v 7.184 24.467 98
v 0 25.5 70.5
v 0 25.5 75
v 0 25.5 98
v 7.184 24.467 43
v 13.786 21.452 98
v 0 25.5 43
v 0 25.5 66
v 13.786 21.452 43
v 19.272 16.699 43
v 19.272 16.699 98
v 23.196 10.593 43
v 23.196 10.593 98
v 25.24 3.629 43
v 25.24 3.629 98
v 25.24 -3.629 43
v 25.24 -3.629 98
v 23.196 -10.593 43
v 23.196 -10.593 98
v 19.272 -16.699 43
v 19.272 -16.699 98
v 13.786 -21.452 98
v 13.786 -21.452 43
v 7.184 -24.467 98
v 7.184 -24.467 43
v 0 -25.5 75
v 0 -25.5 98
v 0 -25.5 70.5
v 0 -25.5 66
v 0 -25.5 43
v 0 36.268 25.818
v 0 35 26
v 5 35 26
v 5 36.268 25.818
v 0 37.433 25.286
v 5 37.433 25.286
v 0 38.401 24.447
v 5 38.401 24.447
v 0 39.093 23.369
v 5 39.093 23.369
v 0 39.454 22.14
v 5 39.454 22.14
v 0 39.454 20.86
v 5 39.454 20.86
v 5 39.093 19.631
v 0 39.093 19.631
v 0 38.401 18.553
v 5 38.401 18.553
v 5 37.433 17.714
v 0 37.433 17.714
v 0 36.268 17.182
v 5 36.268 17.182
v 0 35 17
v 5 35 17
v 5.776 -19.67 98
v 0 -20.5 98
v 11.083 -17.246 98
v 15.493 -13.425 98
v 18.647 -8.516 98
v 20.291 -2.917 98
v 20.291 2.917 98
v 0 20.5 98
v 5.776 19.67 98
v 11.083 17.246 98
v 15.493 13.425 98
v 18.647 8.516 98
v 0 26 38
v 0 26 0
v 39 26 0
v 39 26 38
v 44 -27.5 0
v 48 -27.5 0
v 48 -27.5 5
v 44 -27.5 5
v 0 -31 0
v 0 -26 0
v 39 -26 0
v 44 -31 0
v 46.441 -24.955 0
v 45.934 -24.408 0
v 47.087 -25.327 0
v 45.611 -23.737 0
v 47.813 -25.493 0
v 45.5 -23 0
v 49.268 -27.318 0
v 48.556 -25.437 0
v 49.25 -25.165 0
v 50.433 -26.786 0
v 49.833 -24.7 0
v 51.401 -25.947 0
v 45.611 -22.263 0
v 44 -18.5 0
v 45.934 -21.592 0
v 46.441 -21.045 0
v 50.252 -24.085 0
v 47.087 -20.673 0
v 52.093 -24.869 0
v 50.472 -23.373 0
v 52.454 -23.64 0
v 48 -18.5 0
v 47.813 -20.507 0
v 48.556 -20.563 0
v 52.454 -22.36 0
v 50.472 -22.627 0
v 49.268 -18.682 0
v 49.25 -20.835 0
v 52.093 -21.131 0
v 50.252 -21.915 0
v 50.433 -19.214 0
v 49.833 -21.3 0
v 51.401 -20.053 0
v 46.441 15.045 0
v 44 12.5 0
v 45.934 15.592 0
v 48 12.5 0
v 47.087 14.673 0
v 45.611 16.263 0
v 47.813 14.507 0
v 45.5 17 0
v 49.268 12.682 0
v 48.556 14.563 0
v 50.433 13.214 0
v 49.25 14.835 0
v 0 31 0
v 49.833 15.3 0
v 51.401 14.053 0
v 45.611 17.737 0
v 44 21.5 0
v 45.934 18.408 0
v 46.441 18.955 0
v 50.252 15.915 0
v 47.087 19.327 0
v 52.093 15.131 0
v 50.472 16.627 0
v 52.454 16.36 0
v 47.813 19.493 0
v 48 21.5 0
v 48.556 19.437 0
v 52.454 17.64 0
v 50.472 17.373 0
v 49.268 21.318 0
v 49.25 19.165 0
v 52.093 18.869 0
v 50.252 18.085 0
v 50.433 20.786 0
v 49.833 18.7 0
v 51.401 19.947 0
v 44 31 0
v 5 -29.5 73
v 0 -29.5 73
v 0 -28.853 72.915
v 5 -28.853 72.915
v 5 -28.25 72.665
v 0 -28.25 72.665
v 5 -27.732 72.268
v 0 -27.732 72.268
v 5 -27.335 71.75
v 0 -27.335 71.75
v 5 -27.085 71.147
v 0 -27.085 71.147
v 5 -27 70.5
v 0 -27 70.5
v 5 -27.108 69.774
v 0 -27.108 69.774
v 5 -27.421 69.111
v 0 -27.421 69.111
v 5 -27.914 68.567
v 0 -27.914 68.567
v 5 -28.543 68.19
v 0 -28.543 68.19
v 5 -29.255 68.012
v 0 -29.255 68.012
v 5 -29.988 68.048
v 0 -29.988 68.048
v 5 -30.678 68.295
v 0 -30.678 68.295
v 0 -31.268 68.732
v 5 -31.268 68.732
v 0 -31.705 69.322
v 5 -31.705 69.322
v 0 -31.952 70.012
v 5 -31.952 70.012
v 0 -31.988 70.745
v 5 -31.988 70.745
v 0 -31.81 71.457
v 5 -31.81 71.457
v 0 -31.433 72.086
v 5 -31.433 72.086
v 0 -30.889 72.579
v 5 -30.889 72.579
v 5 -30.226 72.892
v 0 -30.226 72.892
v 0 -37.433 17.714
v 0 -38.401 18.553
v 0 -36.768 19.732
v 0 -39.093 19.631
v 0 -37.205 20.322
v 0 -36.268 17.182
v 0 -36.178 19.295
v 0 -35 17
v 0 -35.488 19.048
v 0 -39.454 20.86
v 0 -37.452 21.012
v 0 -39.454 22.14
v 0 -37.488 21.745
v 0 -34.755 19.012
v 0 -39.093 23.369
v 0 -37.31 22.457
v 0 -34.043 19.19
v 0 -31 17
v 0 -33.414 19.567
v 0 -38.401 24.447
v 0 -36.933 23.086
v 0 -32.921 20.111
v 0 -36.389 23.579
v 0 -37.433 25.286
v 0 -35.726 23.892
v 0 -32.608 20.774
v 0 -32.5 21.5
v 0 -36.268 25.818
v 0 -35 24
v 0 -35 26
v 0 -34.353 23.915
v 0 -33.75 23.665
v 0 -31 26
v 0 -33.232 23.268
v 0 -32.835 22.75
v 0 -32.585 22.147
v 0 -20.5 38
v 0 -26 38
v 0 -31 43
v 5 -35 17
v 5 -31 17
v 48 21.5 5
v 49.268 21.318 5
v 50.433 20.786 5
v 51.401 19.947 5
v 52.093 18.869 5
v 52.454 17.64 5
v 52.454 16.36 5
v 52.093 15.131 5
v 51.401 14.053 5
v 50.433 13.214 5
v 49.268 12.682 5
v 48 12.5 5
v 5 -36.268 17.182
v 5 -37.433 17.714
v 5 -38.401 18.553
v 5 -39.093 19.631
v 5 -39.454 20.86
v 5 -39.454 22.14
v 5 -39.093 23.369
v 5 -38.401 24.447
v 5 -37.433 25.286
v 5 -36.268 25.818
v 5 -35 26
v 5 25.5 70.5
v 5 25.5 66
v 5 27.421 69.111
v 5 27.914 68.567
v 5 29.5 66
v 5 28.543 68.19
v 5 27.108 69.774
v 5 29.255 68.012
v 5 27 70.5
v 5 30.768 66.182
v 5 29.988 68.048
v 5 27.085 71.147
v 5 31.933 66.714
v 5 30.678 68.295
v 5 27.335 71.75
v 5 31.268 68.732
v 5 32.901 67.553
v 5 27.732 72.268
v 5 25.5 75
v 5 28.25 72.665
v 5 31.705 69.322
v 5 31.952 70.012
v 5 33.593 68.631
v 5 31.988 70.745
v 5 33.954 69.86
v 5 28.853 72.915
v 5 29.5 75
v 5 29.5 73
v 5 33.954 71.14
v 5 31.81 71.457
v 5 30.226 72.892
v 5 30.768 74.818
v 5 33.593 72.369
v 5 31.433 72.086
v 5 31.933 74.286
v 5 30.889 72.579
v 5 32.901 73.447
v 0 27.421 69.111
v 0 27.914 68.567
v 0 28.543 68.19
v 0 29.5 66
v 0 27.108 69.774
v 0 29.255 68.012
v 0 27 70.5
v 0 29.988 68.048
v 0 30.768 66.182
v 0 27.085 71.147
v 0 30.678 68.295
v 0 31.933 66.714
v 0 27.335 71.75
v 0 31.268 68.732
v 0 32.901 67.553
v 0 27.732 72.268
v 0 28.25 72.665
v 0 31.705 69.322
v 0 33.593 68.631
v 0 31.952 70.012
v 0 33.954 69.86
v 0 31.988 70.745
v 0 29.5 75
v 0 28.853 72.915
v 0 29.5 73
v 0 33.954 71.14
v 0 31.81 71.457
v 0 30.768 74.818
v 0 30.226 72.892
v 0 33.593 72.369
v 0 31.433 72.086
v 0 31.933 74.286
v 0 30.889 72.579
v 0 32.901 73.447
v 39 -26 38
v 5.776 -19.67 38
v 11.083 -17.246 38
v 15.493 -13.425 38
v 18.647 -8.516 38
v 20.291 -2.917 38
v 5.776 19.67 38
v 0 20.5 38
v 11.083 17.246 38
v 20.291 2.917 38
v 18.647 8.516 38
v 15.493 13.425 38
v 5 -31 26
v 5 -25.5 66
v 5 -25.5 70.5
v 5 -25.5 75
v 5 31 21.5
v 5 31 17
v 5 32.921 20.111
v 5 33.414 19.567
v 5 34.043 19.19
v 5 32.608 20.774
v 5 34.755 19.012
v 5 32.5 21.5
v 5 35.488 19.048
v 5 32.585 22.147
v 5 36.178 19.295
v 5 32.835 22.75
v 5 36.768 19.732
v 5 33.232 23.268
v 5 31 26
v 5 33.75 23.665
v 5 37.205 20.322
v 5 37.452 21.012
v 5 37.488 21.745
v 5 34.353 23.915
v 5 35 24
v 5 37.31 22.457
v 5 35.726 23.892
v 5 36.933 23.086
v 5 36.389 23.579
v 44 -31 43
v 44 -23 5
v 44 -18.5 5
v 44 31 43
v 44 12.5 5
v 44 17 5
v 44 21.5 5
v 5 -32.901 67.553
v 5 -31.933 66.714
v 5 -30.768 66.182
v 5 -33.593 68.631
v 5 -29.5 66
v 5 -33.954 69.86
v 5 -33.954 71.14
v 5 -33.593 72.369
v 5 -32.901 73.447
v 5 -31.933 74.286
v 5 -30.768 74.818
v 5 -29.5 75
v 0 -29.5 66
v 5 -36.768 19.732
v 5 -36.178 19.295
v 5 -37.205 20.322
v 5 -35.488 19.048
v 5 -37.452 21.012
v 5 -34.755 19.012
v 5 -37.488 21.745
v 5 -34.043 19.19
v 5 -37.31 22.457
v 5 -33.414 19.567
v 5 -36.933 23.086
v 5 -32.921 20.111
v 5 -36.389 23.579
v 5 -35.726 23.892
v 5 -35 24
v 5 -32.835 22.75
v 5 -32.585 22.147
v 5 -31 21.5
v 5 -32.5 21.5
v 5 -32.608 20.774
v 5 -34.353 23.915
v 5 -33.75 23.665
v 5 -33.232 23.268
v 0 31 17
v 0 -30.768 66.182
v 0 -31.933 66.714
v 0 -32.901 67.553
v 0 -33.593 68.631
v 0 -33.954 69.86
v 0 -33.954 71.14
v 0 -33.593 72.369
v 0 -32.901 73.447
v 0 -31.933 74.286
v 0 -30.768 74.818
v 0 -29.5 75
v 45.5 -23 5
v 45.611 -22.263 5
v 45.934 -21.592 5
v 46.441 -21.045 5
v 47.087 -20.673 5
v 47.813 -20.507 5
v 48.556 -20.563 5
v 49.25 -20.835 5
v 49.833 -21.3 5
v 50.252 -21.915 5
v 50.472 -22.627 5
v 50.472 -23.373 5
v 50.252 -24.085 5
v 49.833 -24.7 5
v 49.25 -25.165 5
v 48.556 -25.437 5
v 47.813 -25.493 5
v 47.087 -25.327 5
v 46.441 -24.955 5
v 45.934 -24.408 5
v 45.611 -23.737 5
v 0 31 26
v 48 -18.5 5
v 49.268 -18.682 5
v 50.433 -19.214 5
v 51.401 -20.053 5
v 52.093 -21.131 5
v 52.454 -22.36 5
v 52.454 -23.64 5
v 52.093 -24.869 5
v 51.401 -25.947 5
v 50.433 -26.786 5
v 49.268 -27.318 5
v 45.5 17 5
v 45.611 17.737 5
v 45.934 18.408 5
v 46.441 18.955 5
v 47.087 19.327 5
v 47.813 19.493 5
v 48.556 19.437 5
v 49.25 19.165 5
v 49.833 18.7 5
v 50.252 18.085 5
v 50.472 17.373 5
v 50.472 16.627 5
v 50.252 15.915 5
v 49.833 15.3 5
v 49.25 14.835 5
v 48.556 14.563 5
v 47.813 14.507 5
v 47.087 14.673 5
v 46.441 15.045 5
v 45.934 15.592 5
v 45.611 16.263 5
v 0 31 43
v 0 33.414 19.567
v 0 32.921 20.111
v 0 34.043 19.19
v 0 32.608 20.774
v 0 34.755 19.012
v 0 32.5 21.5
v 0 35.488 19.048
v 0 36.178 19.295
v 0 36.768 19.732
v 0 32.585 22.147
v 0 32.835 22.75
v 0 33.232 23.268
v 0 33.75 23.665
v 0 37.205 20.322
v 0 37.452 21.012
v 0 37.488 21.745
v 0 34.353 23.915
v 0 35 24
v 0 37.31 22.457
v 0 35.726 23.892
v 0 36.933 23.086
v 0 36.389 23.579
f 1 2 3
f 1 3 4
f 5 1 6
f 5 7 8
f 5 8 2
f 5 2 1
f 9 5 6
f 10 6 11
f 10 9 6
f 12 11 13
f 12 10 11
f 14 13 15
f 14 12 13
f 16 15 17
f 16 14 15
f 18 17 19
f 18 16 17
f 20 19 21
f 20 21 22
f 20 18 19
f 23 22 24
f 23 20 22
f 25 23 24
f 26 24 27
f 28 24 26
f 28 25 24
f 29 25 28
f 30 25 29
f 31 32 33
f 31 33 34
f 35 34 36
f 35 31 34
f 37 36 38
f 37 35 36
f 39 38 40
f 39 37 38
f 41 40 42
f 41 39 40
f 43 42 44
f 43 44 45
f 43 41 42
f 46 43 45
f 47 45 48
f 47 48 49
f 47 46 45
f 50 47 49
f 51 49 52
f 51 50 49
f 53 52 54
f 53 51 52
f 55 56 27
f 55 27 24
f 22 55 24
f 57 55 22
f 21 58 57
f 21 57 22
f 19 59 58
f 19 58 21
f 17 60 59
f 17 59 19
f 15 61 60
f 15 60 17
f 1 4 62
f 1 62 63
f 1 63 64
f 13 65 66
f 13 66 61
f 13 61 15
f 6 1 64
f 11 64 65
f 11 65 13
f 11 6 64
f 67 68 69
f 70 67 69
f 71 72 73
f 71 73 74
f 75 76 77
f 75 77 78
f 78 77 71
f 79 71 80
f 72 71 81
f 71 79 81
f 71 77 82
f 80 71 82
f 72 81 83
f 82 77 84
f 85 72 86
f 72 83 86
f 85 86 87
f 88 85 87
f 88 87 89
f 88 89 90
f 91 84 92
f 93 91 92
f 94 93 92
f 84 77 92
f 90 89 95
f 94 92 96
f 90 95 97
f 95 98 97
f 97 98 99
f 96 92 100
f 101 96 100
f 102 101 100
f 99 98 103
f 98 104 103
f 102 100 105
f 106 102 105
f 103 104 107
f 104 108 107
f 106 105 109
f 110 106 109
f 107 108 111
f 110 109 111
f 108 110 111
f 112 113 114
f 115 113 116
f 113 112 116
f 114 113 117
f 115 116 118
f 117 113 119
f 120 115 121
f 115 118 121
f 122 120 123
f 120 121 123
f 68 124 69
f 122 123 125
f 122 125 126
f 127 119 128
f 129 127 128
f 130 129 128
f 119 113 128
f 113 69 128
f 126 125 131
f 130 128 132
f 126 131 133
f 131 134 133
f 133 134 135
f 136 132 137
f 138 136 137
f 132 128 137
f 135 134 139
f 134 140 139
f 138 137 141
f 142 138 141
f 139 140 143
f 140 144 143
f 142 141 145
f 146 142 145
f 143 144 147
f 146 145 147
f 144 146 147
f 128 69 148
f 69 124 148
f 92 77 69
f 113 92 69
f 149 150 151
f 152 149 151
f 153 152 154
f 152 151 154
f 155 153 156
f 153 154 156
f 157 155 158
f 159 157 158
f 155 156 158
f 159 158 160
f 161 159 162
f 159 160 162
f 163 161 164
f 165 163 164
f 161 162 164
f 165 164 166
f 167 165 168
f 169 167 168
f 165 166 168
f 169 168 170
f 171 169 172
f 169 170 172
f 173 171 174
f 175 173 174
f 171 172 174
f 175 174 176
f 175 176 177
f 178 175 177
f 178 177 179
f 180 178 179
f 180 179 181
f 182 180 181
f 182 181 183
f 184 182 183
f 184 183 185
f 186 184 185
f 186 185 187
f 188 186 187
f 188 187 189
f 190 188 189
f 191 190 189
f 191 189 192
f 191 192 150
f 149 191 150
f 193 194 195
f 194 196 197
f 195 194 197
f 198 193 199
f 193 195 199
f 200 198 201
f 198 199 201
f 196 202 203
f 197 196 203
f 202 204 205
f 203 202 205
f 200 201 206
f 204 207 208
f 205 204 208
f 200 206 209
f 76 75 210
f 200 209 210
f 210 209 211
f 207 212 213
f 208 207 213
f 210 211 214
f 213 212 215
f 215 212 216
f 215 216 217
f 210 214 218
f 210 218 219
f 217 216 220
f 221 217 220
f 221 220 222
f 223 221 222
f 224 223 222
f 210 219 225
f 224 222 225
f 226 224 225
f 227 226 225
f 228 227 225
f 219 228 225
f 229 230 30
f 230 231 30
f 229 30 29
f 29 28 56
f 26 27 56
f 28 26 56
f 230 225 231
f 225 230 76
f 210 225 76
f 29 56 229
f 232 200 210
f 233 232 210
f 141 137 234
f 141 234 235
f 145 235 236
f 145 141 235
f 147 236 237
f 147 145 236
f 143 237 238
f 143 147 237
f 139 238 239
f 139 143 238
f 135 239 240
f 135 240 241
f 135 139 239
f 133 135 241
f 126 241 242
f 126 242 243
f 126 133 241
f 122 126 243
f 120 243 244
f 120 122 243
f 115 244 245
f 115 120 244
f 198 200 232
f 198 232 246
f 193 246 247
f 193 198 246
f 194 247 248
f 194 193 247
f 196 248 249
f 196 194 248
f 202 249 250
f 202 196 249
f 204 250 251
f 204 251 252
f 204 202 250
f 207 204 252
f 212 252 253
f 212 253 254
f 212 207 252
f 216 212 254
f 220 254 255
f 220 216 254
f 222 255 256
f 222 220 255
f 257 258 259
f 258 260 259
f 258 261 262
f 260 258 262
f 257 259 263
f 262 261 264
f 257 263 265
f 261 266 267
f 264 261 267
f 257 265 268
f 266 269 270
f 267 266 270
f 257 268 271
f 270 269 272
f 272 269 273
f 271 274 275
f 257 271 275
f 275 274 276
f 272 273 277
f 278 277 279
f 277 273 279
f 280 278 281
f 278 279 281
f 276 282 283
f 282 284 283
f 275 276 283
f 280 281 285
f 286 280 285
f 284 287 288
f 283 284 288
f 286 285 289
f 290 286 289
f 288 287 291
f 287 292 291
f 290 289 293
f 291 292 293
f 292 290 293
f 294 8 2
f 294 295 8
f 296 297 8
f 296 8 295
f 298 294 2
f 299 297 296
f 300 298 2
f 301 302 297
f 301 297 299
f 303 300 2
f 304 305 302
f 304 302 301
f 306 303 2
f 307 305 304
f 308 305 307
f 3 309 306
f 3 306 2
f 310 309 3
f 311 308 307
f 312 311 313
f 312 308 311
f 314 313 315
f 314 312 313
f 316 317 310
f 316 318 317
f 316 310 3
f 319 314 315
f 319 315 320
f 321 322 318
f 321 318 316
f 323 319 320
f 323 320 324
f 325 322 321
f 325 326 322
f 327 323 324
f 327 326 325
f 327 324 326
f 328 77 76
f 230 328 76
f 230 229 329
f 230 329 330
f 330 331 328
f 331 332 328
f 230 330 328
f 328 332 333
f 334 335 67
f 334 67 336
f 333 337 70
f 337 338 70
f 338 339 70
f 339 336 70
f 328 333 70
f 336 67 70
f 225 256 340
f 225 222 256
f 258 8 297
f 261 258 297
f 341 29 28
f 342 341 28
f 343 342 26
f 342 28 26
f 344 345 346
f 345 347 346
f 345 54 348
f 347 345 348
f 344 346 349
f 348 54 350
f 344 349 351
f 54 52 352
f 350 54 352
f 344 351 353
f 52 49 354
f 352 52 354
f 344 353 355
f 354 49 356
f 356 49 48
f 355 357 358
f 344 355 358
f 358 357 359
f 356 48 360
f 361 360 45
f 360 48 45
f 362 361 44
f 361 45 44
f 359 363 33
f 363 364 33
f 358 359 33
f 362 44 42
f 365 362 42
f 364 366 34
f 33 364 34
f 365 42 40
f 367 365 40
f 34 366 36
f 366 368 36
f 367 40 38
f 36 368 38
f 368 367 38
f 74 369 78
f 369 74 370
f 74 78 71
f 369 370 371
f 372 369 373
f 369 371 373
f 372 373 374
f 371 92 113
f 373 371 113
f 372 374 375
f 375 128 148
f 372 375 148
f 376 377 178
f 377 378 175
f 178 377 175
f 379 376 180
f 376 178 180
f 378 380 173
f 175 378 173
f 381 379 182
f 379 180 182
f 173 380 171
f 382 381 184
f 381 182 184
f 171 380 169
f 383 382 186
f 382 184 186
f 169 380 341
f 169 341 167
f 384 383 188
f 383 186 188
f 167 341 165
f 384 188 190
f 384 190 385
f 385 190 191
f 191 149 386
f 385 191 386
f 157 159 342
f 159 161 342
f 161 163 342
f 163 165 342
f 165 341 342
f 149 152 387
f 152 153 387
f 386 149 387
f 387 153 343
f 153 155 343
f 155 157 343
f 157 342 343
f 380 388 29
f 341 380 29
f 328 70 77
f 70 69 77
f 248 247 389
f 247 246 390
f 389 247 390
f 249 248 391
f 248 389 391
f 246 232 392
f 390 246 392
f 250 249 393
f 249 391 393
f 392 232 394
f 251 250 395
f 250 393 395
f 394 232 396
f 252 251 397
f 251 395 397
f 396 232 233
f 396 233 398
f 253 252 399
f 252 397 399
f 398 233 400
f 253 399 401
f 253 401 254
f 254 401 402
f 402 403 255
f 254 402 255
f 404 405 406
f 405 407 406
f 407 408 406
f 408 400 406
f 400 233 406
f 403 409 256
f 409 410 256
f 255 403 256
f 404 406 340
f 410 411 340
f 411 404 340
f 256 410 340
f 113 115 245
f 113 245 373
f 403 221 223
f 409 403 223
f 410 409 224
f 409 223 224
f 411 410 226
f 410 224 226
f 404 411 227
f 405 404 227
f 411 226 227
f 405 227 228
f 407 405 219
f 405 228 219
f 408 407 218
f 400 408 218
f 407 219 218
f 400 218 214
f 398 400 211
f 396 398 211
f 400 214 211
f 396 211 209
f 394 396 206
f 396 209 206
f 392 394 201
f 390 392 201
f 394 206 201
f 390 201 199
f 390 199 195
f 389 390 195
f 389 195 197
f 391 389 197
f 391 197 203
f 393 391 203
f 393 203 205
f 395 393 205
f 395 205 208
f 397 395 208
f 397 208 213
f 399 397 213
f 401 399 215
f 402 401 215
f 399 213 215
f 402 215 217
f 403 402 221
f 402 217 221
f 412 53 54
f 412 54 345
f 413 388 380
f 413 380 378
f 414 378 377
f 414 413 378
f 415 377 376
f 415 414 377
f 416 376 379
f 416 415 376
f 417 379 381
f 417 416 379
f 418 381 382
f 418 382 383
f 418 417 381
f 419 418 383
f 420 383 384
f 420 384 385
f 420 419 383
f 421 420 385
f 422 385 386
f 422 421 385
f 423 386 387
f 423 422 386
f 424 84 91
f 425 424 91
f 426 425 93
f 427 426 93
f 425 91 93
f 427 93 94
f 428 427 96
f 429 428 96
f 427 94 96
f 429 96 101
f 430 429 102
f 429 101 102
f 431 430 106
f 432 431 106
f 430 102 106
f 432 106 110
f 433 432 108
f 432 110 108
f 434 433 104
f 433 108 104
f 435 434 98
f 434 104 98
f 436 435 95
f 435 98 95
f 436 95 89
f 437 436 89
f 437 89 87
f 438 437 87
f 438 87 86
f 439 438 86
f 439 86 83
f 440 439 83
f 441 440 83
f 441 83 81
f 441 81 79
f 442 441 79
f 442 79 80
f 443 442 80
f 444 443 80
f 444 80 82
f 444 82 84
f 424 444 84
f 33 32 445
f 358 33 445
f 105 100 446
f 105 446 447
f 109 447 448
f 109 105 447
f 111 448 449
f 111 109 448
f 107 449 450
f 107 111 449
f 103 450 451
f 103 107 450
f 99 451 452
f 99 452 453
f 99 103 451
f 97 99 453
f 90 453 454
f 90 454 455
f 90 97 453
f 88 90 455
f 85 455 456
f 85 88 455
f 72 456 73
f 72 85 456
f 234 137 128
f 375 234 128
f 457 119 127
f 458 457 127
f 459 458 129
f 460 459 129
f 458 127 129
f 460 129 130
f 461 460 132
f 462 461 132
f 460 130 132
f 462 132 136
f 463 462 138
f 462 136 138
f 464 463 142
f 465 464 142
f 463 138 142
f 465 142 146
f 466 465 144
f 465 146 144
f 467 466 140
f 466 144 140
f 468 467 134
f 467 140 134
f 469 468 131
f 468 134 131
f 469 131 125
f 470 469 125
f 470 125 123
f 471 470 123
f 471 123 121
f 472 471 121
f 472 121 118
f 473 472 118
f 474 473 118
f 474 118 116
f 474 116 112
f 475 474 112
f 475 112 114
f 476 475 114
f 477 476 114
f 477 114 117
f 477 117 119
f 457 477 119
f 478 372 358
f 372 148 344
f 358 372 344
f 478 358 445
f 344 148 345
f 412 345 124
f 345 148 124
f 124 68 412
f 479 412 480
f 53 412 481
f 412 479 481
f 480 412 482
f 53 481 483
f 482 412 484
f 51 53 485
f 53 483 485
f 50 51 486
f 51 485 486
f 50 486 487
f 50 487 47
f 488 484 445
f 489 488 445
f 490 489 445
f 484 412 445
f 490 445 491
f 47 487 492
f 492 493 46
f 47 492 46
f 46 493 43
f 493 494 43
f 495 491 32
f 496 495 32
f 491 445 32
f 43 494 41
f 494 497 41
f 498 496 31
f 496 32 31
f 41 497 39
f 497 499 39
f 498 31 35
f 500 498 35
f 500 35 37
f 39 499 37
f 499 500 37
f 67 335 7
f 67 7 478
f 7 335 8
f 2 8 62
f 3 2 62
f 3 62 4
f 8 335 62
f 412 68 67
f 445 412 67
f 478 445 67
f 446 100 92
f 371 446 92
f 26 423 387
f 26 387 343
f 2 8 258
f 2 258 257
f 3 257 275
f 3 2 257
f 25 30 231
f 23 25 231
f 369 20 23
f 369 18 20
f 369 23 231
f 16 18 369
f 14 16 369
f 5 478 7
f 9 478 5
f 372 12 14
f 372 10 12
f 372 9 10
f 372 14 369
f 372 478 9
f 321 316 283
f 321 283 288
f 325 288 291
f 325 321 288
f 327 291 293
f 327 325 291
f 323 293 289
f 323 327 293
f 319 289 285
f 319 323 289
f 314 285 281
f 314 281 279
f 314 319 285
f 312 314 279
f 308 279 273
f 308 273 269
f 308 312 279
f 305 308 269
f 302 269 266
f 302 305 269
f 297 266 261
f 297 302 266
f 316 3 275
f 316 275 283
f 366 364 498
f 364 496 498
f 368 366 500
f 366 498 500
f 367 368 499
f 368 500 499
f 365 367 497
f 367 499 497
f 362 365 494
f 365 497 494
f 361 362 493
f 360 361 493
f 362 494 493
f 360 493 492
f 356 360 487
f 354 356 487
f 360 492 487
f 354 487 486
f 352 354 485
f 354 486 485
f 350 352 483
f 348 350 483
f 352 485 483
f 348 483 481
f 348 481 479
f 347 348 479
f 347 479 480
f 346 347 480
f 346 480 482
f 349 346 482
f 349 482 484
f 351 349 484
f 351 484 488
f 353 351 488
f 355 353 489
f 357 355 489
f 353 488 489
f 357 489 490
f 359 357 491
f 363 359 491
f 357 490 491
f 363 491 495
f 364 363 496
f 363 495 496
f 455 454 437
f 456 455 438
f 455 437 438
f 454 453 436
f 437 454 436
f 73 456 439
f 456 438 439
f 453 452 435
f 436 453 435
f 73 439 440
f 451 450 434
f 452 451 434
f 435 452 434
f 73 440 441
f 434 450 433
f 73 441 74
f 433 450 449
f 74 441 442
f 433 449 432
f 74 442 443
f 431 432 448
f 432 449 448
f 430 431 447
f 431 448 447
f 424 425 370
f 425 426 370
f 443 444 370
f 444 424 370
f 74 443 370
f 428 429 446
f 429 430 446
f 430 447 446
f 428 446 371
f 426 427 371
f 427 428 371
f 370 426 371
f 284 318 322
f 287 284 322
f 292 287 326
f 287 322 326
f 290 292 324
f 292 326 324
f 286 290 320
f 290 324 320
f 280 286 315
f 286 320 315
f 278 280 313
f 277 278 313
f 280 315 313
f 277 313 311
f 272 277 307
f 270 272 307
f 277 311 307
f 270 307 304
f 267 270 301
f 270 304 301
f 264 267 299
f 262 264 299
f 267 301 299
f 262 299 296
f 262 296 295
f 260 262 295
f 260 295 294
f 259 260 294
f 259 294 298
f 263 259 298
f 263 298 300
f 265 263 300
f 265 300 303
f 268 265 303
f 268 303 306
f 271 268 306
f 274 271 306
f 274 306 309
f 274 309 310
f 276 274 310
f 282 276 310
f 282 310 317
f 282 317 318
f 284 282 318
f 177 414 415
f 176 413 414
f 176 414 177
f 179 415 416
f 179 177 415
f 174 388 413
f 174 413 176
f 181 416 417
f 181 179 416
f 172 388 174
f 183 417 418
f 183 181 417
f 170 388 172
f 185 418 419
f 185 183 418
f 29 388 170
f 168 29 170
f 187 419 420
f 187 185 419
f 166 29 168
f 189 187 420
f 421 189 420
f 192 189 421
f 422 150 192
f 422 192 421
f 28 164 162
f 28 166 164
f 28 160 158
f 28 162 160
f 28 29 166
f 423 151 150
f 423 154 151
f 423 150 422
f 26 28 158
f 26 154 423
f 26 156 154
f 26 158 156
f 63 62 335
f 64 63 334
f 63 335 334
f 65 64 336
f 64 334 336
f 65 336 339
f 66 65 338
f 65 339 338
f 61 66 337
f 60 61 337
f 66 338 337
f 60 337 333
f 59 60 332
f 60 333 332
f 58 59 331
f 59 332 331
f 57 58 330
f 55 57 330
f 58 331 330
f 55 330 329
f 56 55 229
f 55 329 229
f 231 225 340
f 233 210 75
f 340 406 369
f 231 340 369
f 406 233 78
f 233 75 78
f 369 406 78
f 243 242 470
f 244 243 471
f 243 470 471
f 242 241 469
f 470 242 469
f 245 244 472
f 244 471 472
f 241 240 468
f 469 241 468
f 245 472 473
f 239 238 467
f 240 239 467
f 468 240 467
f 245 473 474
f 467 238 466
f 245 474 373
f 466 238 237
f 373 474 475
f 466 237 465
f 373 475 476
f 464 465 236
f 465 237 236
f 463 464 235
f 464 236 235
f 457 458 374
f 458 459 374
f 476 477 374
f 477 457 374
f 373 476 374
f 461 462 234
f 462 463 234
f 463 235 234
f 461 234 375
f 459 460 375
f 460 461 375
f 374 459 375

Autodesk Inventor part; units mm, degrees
ref_plane "YZ Plane" through (0, 0, 0) normal (1, 0, 0) x (0, 1, 0)
ref_plane "XZ Plane" through (0, 0, 0) normal (0, 1, 0) x (-1, 0, 0)
ref_plane "XY Plane" through (0, 0, 0) normal (0, 0, 1) x (1, 0, 0)
sketch "Sketch1" plane through (0, 0, 0) normal (0, 0, 1) x (1, 0, 0)
  line L0 (39, -26) -> (-39, -26)
  line L1 (-39, -26) -> (-39, 26)
  line L2 (-39, 26) -> (39, 26)
  line L3 (39, 26) -> (39, -26)
  line L4 (39, -26) -> (-39, 26) construction
  line L5 (-39, -26) -> (39, 26) construction
  line L6 (44, 31) -> (-44, 31)
  line L7 (-44, 31) -> (-44, -31)
  line L8 (-44, -31) -> (44, -31)
  line L9 (44, -31) -> (44, 31)
  point P0 (0, 0)
  dimension "d0" = 78
  dimension "d1" = 52
  dimension "d2" = 5
extrude "Extrusion1" add sketch "Sketch1" along normal blind 43
sketch "Sketch2" plane through (0, 0, 43) normal (0, 0, 1) x (1, 0, 0)
  line L0 (-44, 31) -> (-44, -31) projected
  line L1 (-44, -31) -> (44, -31) projected
  line L2 (44, -31) -> (44, 31) projected
  line L3 (44, 31) -> (-44, 31) projected
  line L4 (39, -26) -> (-39, -26) projected
  line L5 (-39, -26) -> (-39, 26) projected
  line L6 (-39, 26) -> (39, 26) projected
  line L7 (39, 26) -> (39, -26) projected
  point P0 (0, 0)
extrude "Extrusion2" add sketch "Sketch2" against normal blind 5 contours L3 L2 L1 L0 | L4 L5 L6 L7
sketch "Sketch3" plane through (0, 0, 43) normal (0, 0, 1) x (1, 0, 0)
  circle A0 centre (0, 0) radius 20.5
  dimension "d7" = 41
extrude "Extrusion3" cut sketch "Sketch3" against normal blind 5
sketch "Sketch4" plane through (0, 0, 43) normal (0, 0, 1) x (1, 0, 0)
  circle A0 centre (0, 0) radius 20.5 projected
  circle A1 centre (0, 0) radius 25.5
  dimension "d10" = 5
extrude "Extrusion4" add sketch "Sketch4" along normal blind 55
sketch "Sketch5" plane through (0, 0, 0) normal (1, 0, 0) x (0, 1, 0)
  line L0 (25.5, 43) -> (25.5, 98) projected
  line L1 (31, 0) -> (31, 43) projected
  line L2 (-31, 43) -> (31, 43) projected
  line L3 (-31, 0) -> (31, 0) projected
  line L4 (-31, 0) -> (-31, 43) projected
  line L5 (-25.5, 43) -> (-25.5, 98) projected
  line L6 (25.5, 98) -> (-25.5, 98) projected
  point P0 (0, 0)
extrude "Extrusion5" cut sketch "Sketch5" against normal blind 55
sketch "Sketch7" plane through (0, 0, 0) normal (0, 0, -1) x (-1, 0, 0)
  circle A0 centre (-48, 17) radius 2.5
  circle A1 centre (-48, -23) radius 2.5
  line L0 (-48, 17) -> (-44, 17)
  line L1 (-44, -31) -> (-44, 31) projected
  line L2 (-44, 22.4083) -> (-44, 31)
  line L3 (-48, -23) -> (-44, -23)
  line L4 (-44, 31) -> (0, 31) projected
  line L5 (0, -31) -> (-44, -31) projected
  line L6 (-44, -28.4083) -> (-44, -31)
  line L7 (-44, -17.5917) -> (-44, 10.8153)
  line L8 (-44, 23.1847) -> (-44, 31)
  arc A2 (-48, 21.5) -> (-48, 12.5) centre (-48, 17) ccw
  arc A3 (-48, -18.5) -> (-48, -27.5) centre (-48, -23) ccw
  line L9 (-44, 19.0616) -> (-44, 31)
  line L10 (-44, -27.5) -> (-44, -31)
  line L11 (-44, -18.5) -> (-44, 14.9384)
  line L12 (-48, -27.5) -> (-44, -27.5)
  line L13 (-48, -18.5) -> (-44, -18.5)
  line L14 (-48, 21.5) -> (-44, 21.5)
  line L15 (-48, 12.5) -> (-44, 12.5)
  line L16 (-44, -31) -> (-44, 31) projected
  point P0 (0, 0)
  point P1 (-44, 15.1972)
  point P2 (-44, -24.8028)
  point P3 (-44, -21.1972)
  point P4 (-44, -25.0616)
  point P5 (-44, -20.9384)
  dimension "d40" = 5
  dimension "d45" = 4
  dimension "d46" = 5
  dimension "d68" = 40
  dimension "d75" = 8
  dimension "d76" = 4
  dimension "d77" = 2
  dimension "d78" = 2
extrude "Extrusion7" add sketch "Sketch7" against normal blind 5
sketch "Sketch10" plane through (0, 0, 0) normal (-1, 0, 0) x (0, 0, 1)
  circle A0 centre (21.5, 35) radius 2.5
  line L0 (0, 26) -> (0, 31) projected
  line L1 (0, 31) -> (43, 31) projected
  arc A1 (26, 35) -> (17, 35) centre (21.5, 35) ccw
  line L2 (43, 25.5) -> (98, 25.5) projected
  circle A2 centre (70.5, 29.5) radius 2.5
  arc A3 (75, 29.5) -> (66, 29.5) centre (70.5, 29.5) ccw
  line L3 (0, -31) -> (43, -31) projected
  line L4 (21.5, -31) -> (21.5, -35)
  circle A4 centre (21.5, -35) radius 2.5
  arc A5 (17, -35) -> (26, -35) centre (21.5, -35) ccw
  line L5 (43, -25.5) -> (98, -25.5) projected
  line L6 (70.5, -25.5) -> (70.5, -29.5)
  circle A6 centre (70.5, -29.5) radius 2.5
  arc A7 (66, -29.5) -> (75, -29.5) centre (70.5, -29.5) ccw
  line L7 (0, -31) -> (16.0917, -31)
  line L8 (26.9083, -31) -> (43, -31)
  line L9 (43, -25.5) -> (65.0917, -25.5)
  line L10 (43, -31) -> (43, 31) projected
  line L11 (75.9083, -25.5) -> (98, -25.5)
  line L12 (0, 31) -> (16.0917, 31)
  line L13 (26.9083, 31) -> (43, 31)
  line L14 (65.0917, 25.5) -> (43, 25.5)
  line L15 (75, 25.5) -> (98, 25.5)
  line L16 (98, 20.5) -> (98, -20.5) projected
  line L17 (70.5, 29.5) -> (70.5, 25.5)
  line L18 (98, 25.5) -> (98, 20.5) projected
  line L19 (21.5, 35) -> (21.5, 31)
  line L20 (16.0917, 31) -> (0, 31)
  line L21 (65.0917, 25.5) -> (43, 25.5)
  line L22 (75, 25.5) -> (98, 25.5)
  line L23 (75.9083, -25.5) -> (98, -25.5)
  line L24 (65.0917, -25.5) -> (43, -25.5)
  line L25 (26.9083, -31) -> (43, -31)
  line L26 (16.0917, -31) -> (0, -31)
  line L27 (17, 35) -> (17, 31)
  line L28 (26, 35) -> (26, 31)
  line L29 (66, 25.5) -> (66, 29.5)
  line L30 (75, 25.5) -> (75, 29.5)
  line L31 (26, -35) -> (26, -31)
  line L32 (17, -35) -> (17, -31)
  line L33 (75, -29.5) -> (75, -25.5)
  line L34 (66, -29.5) -> (66, -25.5)
  point P0 (0, 0)
  point P1 (19.4384, 31)
  point P2 (23.5616, 31)
  point P3 (68.4384, 25.5)
  point P4 (72.5616, 25.5)
  point P5 (23.5616, -31)
  point P6 (19.4384, -31)
  point P7 (72.5616, -25.5)
  point P8 (68.4384, -25.5)
  point P9 (26, -31)
  point P10 (17, -31)
  dimension "d52" = 5
  dimension "d56" = 2
  dimension "d57" = 5
  dimension "d58" = 2
  dimension "d59" = 4
  dimension "d60" = 5
  dimension "d61" = 2
  dimension "d70" = 27.5
  dimension "d71" = 4
  dimension "d72" = 27.5
  dimension "d73" = 4
  dimension "d74" = 90
  dimension "d80" = 4
  dimension "d81" = 2
  dimension "d82" = 5
extrude "Extrusion8" add sketch "Sketch10" against normal blind 5
properties part number "soporte p3"
